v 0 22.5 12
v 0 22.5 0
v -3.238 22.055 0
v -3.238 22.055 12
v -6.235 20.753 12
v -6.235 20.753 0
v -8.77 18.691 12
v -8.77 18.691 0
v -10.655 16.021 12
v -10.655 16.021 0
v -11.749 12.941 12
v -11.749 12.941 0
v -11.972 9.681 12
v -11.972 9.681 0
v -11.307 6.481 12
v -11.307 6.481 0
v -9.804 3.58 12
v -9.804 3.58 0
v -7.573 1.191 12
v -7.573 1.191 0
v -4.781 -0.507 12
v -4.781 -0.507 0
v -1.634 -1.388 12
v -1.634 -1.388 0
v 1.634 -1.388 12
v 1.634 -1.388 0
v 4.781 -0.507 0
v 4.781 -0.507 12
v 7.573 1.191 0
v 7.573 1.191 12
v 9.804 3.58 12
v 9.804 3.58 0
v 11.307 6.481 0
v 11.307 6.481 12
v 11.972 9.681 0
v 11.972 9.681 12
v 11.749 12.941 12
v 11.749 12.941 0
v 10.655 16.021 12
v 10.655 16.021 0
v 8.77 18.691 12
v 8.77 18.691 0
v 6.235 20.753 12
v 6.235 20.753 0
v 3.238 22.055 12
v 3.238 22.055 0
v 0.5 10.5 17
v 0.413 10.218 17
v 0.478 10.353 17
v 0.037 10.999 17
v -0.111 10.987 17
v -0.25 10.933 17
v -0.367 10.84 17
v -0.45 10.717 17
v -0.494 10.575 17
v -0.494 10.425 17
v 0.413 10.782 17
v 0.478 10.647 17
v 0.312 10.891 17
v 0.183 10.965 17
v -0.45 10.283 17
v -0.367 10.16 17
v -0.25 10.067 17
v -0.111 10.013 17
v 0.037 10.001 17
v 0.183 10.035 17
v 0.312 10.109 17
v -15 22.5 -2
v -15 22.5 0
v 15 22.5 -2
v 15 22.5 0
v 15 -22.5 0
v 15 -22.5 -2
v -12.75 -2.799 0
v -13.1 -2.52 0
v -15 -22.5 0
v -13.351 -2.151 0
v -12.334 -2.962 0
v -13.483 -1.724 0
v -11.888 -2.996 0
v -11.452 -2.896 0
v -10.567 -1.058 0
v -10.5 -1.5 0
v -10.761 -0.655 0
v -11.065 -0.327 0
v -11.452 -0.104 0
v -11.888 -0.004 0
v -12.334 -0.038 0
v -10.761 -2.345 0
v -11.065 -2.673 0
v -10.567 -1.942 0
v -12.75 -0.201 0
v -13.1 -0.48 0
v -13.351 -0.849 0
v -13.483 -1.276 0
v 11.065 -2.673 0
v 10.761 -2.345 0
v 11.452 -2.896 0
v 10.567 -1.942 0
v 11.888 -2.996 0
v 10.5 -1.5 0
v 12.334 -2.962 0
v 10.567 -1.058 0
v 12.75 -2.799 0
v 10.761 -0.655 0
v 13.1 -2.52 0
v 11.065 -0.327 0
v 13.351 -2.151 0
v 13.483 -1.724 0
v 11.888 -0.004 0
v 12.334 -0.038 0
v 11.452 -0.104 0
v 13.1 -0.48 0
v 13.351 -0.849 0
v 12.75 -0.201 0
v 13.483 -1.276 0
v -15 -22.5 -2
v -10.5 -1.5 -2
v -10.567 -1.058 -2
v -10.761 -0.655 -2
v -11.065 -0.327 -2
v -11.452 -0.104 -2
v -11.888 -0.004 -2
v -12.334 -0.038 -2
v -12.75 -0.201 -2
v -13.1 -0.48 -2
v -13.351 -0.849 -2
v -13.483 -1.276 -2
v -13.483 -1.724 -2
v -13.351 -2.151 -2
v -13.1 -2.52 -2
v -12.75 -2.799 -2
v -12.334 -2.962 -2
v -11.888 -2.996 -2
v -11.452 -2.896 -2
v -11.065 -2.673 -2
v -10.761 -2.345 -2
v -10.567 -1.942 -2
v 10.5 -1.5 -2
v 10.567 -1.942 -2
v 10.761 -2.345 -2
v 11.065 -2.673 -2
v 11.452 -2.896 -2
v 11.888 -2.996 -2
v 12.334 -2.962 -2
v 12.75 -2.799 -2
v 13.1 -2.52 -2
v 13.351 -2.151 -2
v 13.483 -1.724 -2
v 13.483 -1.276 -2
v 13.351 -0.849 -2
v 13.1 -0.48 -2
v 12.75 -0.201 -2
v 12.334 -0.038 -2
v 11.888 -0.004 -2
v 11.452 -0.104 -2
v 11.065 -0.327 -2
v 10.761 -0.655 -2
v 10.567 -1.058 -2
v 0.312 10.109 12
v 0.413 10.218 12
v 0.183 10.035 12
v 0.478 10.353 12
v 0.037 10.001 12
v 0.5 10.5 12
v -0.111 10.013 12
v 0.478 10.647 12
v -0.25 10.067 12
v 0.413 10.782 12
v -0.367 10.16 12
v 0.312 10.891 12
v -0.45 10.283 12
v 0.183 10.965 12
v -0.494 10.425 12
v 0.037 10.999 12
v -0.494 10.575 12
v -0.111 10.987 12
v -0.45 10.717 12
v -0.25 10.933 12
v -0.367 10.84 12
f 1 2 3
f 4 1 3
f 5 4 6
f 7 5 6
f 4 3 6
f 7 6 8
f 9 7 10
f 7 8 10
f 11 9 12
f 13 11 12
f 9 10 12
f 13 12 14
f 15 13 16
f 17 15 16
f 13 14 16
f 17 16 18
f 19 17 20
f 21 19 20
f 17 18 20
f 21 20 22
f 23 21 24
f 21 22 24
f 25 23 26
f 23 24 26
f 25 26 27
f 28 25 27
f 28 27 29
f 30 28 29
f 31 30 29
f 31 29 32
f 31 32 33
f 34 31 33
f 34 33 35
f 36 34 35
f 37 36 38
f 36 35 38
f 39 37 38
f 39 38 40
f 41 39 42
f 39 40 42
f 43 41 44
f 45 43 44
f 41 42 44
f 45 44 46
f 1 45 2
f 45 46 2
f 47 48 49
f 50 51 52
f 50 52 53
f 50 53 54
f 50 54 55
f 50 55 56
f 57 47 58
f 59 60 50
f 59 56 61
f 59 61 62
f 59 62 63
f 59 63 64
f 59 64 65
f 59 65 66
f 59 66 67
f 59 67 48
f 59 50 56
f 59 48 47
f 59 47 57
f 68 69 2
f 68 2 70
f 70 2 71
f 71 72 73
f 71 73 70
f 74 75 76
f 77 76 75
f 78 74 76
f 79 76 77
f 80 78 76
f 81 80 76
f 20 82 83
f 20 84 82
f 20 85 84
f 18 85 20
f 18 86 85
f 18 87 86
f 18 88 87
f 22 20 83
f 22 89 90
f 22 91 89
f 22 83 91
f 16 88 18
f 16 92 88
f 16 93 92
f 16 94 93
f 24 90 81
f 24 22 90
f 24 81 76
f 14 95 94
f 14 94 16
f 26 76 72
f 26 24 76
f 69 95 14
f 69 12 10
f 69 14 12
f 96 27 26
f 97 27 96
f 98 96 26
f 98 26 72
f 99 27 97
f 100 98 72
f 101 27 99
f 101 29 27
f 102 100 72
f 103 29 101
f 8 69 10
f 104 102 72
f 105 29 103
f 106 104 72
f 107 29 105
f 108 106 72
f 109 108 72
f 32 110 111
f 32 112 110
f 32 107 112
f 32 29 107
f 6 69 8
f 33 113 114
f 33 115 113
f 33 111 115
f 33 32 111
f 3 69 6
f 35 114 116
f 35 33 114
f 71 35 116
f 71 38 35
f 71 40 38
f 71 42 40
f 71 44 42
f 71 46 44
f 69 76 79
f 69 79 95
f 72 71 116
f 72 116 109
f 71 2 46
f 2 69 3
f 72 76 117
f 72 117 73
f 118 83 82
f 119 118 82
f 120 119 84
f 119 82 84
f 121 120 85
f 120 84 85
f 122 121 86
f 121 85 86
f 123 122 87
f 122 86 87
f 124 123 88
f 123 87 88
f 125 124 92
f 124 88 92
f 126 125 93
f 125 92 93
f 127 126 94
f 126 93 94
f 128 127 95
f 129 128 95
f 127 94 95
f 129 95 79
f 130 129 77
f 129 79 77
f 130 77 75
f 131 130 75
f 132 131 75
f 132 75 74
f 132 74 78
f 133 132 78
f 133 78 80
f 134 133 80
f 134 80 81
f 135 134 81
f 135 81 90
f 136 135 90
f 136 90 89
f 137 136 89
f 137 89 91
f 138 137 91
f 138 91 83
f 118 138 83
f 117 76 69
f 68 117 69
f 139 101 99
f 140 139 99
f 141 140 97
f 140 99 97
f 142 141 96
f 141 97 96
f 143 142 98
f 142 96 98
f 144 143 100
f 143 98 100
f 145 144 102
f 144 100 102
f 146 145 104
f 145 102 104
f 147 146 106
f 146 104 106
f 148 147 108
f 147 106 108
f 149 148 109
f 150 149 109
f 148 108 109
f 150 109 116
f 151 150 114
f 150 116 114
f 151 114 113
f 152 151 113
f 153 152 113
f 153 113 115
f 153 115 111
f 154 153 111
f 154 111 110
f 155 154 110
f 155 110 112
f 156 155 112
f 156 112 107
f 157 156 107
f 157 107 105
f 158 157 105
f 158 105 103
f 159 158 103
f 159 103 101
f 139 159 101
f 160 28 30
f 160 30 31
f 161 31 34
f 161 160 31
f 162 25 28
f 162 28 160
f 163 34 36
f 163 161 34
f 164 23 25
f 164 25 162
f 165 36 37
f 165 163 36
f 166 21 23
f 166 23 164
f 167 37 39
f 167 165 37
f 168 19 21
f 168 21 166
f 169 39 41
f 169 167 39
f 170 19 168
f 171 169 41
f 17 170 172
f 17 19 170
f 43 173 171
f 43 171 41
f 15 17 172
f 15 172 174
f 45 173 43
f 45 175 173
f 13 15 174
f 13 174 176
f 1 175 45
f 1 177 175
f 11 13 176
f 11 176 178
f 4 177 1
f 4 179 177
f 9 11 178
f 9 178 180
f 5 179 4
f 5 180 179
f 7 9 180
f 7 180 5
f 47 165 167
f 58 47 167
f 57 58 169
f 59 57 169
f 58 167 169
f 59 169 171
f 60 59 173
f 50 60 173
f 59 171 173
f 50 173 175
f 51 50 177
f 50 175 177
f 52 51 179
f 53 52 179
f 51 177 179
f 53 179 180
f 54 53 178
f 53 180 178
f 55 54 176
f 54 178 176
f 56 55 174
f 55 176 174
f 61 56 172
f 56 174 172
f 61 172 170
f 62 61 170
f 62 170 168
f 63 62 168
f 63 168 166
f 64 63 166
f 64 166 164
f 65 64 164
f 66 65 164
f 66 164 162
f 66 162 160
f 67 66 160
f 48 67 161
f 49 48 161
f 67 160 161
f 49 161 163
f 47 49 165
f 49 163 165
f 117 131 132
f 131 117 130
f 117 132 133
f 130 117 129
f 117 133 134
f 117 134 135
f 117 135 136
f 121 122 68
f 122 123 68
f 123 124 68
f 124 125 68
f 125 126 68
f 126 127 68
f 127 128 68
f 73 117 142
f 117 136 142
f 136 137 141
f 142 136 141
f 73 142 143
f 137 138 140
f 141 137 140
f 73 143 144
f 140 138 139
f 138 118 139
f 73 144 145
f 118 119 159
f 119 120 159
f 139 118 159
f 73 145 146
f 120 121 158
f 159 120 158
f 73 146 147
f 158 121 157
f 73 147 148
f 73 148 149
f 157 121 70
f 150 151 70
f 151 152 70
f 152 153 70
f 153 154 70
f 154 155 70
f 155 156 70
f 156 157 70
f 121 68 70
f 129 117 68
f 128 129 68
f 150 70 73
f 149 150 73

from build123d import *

# Parameters (mm, degrees)
SKETCH_1_W          = 30
SKETCH_1_H          = 45
EXTRUDE_1_DEPTH     = 2
SKETCH_2_R          = 12
EXTRUDE_2_DEPTH     = 12
CUT_EXTRUDE_1_REACH = 31.585
SKETCH_3_R          = 1.5
SKETCH_5_R          = 0.5
EXTRUDE_3_DEPTH     = 5


with BuildPart() as part:
    # 草图1 → 凸台-拉伸1 (new body)
    with BuildSketch(Plane.XY):
        Rectangle(SKETCH_1_W, SKETCH_1_H)
    extrude(amount=-EXTRUDE_1_DEPTH)

    # 草图2 → 凸台-拉伸2 (add)
    with BuildSketch(Plane.XY):
        with Locations(Location((0, 10.5, 0), (0, 0, 90))):
            Circle(SKETCH_2_R)
    extrude(amount=EXTRUDE_2_DEPTH)

    # 草图3 → 切除-拉伸1 (cut, up to next)
    with BuildSketch(Plane.XY, mode=Mode.PRIVATE) as cut_extrude_1_sk1:
        with Locations((-12, -1.5)):
            Circle(SKETCH_3_R)
    cut_extrude_1_tool1 = extrude(cut_extrude_1_sk1.sketch, amount=-CUT_EXTRUDE_1_REACH, mode=Mode.PRIVATE) & part.part
    # 草图3 → 切除-拉伸1 (cut, up to next)
    with BuildSketch(Plane.XY, mode=Mode.PRIVATE) as cut_extrude_1_sk2:
        with Locations(Location((12, -1.5, 0), (0, 0, 180))):
            Circle(SKETCH_3_R)
    cut_extrude_1_tool2 = extrude(cut_extrude_1_sk2.sketch, amount=-CUT_EXTRUDE_1_REACH, mode=Mode.PRIVATE) & part.part
    add(cut_extrude_1_tool1.solids().sort_by_distance((-12, -1.5, 0))[0], mode=Mode.SUBTRACT)
    add(cut_extrude_1_tool2.solids().sort_by_distance((12, -1.5, 0))[0], mode=Mode.SUBTRACT)

    # 草图5 → 凸台-拉伸3 (add)
    with BuildSketch(Plane.XY.offset(12)):
        with Locations((0, 10.5)):
            Circle(SKETCH_5_R)
    extrude(amount=EXTRUDE_3_DEPTH)


solid = part.part
